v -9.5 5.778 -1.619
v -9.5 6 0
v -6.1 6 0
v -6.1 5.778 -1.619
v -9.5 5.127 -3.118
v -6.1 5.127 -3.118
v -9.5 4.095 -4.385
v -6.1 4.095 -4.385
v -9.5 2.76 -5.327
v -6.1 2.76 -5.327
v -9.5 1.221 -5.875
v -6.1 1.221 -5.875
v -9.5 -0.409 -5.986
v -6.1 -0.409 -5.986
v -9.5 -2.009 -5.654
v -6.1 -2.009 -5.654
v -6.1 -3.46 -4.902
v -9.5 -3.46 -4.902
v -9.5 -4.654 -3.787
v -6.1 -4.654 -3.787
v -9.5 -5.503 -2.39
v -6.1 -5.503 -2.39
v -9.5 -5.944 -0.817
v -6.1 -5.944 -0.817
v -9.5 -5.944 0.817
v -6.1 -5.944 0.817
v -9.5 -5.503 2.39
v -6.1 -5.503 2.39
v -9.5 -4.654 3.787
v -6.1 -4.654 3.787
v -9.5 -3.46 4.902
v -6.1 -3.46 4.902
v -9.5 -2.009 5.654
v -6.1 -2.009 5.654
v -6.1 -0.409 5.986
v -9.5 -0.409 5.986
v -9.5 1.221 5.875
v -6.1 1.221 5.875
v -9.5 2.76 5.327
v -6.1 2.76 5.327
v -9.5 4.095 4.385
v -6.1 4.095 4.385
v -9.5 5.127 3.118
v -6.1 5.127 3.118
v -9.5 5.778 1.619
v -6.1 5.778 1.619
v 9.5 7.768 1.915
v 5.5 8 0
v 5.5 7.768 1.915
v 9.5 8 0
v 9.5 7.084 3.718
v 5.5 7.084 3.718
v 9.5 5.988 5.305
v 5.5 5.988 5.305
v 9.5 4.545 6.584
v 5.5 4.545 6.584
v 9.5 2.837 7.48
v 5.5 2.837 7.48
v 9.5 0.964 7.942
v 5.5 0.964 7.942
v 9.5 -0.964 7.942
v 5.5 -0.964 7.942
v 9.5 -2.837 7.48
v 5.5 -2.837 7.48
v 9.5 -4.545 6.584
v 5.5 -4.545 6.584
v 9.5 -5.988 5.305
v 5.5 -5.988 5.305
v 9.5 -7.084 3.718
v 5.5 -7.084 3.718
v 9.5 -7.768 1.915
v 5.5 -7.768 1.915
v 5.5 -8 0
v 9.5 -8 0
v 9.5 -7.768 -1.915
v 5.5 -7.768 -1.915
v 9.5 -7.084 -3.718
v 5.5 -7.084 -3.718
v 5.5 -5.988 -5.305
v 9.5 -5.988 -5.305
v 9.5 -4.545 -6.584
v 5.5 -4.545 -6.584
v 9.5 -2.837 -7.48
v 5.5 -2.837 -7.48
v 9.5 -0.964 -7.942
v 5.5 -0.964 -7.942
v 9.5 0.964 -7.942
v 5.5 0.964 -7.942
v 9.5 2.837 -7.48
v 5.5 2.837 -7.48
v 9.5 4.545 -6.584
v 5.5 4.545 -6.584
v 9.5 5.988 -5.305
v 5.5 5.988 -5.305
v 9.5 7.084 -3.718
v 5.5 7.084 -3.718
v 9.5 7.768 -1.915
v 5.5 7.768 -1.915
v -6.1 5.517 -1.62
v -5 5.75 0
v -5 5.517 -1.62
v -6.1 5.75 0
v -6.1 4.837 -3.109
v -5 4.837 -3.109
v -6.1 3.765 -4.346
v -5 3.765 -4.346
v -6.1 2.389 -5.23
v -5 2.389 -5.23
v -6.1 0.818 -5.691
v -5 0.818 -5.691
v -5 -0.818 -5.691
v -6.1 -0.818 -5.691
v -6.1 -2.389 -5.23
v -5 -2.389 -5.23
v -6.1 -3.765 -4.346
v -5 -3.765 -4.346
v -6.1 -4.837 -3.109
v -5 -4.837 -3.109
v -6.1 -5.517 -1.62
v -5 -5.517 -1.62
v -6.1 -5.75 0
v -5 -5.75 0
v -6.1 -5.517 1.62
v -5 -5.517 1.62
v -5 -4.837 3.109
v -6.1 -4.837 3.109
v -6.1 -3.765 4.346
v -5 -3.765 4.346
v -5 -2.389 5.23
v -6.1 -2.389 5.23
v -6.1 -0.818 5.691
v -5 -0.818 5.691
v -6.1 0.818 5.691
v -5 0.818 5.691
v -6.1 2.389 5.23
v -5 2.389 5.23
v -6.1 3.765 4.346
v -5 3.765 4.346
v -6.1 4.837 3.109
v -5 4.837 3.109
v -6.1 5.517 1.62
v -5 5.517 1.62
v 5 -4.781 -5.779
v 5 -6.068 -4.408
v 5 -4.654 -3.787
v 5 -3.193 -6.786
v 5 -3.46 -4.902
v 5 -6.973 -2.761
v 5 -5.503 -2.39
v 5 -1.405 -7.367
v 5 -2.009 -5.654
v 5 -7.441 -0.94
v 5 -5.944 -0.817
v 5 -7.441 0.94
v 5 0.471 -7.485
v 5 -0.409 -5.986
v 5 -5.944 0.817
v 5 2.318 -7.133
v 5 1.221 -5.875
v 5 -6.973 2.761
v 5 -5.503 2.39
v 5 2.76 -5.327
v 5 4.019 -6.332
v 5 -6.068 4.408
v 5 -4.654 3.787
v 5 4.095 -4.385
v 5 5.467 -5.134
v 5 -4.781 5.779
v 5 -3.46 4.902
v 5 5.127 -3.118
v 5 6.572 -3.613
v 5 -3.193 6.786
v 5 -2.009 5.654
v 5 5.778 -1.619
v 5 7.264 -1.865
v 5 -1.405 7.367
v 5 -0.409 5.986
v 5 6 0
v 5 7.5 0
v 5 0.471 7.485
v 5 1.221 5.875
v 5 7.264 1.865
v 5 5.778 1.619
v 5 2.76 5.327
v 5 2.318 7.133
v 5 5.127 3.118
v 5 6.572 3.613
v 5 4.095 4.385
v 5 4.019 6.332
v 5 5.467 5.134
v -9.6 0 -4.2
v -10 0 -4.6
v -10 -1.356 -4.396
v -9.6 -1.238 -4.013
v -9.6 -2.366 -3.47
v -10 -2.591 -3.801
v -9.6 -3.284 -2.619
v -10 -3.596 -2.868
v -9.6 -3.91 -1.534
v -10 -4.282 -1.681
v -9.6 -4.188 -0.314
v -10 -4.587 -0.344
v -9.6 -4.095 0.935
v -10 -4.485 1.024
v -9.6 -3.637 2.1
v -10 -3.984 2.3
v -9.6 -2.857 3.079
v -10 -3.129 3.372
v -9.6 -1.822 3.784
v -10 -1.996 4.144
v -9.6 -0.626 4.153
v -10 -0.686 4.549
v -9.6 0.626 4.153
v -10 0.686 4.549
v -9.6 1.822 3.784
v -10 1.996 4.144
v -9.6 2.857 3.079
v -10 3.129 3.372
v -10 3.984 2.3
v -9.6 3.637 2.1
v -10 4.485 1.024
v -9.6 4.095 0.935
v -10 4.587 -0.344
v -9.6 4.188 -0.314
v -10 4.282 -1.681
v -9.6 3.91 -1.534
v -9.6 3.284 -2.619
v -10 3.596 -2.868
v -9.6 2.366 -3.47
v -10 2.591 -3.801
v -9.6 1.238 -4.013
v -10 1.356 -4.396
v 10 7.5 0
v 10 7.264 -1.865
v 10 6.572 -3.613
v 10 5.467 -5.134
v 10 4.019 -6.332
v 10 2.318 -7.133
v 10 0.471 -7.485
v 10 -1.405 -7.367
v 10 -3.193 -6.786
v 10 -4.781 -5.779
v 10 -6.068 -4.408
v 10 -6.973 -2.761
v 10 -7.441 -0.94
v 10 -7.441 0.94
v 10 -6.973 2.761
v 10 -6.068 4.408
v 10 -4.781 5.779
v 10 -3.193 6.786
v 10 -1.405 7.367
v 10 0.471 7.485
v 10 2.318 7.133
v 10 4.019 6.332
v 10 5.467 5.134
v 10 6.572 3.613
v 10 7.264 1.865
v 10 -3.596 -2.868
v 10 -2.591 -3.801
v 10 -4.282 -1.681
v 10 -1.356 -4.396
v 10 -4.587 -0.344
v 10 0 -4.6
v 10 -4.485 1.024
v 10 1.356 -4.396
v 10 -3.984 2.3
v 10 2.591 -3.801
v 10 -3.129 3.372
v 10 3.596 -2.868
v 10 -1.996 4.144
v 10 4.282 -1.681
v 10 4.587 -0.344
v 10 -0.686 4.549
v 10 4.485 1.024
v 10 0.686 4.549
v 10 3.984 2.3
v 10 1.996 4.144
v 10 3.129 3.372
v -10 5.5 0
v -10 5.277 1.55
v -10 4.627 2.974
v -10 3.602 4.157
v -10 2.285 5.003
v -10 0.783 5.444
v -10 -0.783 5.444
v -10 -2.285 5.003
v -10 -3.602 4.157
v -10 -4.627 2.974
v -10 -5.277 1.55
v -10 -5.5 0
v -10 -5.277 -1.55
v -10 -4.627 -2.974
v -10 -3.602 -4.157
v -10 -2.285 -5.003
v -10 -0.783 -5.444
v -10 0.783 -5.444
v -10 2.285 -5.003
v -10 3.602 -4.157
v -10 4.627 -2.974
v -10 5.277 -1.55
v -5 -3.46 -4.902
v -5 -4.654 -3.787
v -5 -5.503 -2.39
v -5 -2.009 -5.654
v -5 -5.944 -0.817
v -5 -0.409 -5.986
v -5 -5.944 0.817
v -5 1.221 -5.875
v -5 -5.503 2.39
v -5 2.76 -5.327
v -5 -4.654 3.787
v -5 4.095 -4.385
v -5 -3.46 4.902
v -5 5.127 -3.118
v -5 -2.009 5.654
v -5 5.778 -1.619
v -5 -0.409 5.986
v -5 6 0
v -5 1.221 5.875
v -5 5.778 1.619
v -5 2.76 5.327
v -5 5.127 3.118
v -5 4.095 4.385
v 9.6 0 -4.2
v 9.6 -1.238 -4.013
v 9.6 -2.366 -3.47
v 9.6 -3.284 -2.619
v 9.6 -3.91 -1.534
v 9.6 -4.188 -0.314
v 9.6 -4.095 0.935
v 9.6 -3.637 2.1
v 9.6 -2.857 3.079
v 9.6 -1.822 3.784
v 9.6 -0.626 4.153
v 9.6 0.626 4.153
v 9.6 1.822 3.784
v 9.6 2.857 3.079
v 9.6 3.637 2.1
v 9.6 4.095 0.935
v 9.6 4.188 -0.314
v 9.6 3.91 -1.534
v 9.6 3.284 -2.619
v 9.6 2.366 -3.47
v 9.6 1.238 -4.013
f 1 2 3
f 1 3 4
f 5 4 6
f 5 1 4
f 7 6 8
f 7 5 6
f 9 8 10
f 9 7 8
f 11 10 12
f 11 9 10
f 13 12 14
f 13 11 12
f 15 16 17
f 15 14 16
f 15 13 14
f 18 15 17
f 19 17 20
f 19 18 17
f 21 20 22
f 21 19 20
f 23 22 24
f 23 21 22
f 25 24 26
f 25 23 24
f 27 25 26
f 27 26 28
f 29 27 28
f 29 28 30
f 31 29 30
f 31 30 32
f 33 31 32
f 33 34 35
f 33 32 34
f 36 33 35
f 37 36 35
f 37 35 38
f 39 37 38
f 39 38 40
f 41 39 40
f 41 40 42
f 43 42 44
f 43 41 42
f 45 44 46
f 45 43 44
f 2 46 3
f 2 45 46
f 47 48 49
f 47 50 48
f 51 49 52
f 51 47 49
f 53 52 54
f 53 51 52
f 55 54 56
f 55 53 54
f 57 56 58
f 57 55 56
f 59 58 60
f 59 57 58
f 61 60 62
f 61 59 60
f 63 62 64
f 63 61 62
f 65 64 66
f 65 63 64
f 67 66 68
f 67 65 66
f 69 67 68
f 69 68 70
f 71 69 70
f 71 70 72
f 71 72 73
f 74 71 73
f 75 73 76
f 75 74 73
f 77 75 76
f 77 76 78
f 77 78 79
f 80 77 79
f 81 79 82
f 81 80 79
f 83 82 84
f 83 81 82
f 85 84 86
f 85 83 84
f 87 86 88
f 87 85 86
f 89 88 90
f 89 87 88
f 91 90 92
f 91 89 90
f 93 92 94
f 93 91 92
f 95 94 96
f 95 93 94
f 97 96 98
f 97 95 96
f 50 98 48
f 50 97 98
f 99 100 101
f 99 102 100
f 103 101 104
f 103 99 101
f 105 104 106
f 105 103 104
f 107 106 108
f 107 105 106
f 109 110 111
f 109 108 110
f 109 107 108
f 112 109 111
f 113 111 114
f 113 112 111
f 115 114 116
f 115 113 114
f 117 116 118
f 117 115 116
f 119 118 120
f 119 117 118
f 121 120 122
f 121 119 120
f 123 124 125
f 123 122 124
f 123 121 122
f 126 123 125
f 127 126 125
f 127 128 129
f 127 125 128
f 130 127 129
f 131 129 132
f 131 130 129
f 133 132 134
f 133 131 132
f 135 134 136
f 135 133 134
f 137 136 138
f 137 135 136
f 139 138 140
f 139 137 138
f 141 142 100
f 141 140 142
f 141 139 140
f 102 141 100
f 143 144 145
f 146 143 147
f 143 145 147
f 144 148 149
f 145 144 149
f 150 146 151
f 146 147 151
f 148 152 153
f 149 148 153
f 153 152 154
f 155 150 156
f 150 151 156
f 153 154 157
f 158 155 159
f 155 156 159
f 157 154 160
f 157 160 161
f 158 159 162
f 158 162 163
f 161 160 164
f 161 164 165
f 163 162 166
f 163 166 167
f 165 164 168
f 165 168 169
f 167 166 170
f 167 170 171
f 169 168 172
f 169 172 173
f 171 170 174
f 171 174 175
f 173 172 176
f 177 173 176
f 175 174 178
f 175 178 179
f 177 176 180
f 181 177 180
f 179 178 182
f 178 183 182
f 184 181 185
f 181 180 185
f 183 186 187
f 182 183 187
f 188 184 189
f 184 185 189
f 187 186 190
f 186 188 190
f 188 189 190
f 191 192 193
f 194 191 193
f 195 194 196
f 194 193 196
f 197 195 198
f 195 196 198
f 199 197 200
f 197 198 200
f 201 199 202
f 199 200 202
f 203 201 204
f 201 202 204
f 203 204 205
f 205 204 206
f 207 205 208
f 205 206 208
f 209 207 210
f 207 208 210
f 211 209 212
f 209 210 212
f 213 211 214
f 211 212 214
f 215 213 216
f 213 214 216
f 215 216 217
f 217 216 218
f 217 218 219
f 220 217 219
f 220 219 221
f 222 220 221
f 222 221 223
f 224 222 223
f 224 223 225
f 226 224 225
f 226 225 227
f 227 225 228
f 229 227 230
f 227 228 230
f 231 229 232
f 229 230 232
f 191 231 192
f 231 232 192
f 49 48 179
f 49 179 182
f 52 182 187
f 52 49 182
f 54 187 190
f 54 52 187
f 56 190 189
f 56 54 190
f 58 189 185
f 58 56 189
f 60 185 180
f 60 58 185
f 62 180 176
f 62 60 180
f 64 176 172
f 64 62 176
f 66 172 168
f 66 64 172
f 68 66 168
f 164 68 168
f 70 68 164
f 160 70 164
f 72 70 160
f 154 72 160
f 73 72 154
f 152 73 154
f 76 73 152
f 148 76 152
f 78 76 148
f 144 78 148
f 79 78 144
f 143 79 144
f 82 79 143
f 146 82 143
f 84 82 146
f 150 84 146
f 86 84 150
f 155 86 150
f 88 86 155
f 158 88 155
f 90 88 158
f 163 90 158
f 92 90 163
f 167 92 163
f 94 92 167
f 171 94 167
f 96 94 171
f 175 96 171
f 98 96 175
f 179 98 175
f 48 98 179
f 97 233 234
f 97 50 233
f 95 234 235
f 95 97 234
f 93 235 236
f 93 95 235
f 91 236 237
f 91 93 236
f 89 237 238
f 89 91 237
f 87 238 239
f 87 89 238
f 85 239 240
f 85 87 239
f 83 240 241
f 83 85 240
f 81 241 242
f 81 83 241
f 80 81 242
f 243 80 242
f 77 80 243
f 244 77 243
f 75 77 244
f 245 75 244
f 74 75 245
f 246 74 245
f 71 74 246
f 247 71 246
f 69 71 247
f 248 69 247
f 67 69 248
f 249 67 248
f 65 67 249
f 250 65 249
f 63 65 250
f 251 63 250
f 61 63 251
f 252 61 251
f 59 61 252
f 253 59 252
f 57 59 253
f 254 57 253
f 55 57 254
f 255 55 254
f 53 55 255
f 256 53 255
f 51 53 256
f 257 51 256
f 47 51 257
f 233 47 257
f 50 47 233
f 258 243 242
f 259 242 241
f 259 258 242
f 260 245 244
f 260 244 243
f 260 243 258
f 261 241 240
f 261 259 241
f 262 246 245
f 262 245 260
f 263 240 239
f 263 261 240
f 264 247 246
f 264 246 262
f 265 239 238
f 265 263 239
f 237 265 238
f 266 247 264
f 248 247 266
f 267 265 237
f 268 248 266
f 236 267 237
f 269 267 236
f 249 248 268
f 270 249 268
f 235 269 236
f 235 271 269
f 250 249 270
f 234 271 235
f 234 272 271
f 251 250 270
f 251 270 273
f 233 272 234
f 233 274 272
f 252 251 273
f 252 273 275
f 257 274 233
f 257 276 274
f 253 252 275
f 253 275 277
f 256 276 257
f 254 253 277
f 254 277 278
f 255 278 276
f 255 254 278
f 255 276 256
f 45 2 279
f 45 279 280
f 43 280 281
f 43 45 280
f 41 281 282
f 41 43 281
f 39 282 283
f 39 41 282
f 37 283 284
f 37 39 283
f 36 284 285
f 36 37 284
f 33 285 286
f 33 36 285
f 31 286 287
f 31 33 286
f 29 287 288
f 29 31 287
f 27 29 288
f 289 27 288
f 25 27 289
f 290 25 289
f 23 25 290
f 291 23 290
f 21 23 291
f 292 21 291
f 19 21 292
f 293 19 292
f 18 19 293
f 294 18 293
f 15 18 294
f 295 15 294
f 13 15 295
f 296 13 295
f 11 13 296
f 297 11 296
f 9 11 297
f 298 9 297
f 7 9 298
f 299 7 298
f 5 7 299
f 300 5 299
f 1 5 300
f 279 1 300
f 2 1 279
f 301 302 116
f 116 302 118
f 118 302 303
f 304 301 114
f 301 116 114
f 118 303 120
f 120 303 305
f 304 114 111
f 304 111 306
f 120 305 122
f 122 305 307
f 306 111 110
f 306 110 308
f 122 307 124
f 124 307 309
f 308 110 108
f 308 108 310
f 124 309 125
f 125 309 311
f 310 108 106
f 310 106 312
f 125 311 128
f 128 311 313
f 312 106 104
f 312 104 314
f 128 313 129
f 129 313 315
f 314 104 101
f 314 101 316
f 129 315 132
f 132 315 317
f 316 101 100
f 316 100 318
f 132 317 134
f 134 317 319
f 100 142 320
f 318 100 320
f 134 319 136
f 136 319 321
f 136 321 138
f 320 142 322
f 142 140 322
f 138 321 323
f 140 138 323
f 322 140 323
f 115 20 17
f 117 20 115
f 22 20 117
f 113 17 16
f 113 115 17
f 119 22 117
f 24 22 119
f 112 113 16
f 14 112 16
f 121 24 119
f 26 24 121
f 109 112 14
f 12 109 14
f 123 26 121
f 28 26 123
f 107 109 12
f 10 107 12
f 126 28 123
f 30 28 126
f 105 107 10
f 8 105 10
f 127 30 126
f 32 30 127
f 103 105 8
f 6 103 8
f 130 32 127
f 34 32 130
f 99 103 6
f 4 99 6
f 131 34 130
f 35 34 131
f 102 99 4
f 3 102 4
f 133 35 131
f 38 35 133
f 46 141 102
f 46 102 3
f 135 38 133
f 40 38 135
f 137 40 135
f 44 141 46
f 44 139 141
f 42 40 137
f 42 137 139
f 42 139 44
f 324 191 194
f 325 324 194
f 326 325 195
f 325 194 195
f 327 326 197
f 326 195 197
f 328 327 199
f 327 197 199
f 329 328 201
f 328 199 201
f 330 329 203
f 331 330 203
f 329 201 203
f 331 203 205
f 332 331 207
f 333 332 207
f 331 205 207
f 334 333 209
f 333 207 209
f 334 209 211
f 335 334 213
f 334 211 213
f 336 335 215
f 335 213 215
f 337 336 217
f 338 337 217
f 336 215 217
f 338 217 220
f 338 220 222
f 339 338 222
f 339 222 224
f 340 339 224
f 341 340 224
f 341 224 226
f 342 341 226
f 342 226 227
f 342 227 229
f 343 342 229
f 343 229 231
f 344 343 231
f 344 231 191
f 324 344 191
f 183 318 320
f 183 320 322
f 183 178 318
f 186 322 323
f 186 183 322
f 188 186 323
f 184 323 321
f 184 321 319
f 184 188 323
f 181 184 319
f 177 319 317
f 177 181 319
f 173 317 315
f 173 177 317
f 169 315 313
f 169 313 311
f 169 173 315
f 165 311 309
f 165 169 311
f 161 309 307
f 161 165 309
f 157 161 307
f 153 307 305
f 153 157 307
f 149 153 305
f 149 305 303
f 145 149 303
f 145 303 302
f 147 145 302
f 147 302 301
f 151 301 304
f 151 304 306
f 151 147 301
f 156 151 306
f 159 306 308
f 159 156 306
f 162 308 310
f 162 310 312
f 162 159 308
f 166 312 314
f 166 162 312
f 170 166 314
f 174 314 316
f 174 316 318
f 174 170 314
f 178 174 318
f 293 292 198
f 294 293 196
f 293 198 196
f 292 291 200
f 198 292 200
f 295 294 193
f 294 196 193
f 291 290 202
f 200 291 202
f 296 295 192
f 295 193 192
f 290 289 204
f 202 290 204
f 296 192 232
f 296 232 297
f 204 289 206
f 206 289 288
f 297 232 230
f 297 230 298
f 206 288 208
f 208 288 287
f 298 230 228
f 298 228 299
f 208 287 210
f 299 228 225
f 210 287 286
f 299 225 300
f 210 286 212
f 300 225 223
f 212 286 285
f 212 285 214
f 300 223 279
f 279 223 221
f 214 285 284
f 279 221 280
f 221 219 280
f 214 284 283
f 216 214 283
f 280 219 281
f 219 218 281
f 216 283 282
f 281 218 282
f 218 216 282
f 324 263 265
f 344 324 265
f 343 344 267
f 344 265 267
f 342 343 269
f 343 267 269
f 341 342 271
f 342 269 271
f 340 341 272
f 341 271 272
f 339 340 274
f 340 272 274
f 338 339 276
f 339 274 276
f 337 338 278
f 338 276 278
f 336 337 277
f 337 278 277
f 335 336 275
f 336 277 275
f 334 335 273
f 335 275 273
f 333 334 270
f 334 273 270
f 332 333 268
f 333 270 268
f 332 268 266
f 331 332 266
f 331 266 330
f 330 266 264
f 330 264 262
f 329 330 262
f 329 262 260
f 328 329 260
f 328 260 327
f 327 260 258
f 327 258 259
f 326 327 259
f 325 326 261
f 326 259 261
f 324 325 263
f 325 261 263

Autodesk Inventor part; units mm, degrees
ref_plane "YZ Plane" through (0, 0, 0) normal (1, 0, 0) x (0, 1, 0)
ref_plane "XZ Plane" through (0, 0, 0) normal (0, 1, 0) x (-1, 0, 0)
ref_plane "XY Plane" through (0, 0, 0) normal (0, 0, 1) x (1, 0, 0)
sketch "Náčrt1" plane through (0, 0, 0) normal (0, 0, 1) x (1, 0, 0)
  line L0 (-8, 0) -> (8, 0)
  line L1 (8, 0) -> (8, 27.5) construction
  line L2 (8, 27.5) -> (5.5, 27.5) construction
  line L3 (5.5, 27.5) -> (5.5, 26.5) construction
  line L4 (0.5, 21.5) -> (-0.5, 21.5) construction
  line L5 (-5.5, 26.5) -> (-5.5, 27.5) construction
  line L6 (-5.5, 27.5) -> (-8, 27.5) construction
  line L7 (-8, 27.5) -> (-8, 0) construction
  line L8 (-8, 16) -> (-6.85, 16) construction
  line L9 (-6.85, 16) -> (-6.85, 17.25) construction
  line L10 (-6.85, 17.25) -> (-5, 17.25) construction
  line L11 (-5, 17.25) -> (-5, 16) construction
  line L12 (-5, 16) -> (5, 16) construction
  line L13 (5, 16) -> (5, 14) construction
  line L14 (5, 14) -> (8, 14) construction
  arc A0 (-5.5, 26.5) -> (-0.5, 21.5) centre (-0.5, 26.5) ccw construction
  arc A1 (0.5, 21.5) -> (5.5, 26.5) centre (0.5, 26.5) ccw construction
  line L15 (5, 6) -> (5, 8)
  line L16 (5, 8) -> (10, 8)
  line L17 (10, 8) -> (10, 0)
  line L18 (10, 0) -> (8, 0)
  line L19 (-10, 6) -> (-10, 0)
  line L20 (-10, 0) -> (-8, 0)
  line L21 (-5, 6) -> (-5, 5.75)
  line L22 (-5, 5.75) -> (-6.1, 5.75)
  line L23 (-6.1, 5.75) -> (-6.1, 6)
  line L24 (-5, 6) -> (5, 6)
  line L25 (-6.1, 6) -> (-10, 6)
  point P0 (0, 0)
  point P1 (0, 0)
  point P2 (5.5, 21.5)
  point P3 (-5.5, 21.5)
  dimension "d0" = 55
  dimension "d1" = 16
  dimension "d3" = 2.5
  dimension "d4" = 6
  dimension "d5" = 32
  dimension "d6" = 28
  dimension "d7" = 10
  dimension "d8" = 13
  dimension "d9" = 34.5
  dimension "d10" = 1.85
  dimension "d18" = 11
  dimension "d24" = 43
  dimension "d27" = 5
  dimension "d31" = 16
  dimension "d32" = 2
  dimension "d33" = 2
  dimension "d34" = 1.1
  dimension "d35" = 11.5
  dimension "d36" = 12
  dimension "d37" = 20
revolve "Rotace1" add sketch "Náčrt1" angle 360 about axis through (-8, 0, 0) along (1, 0, 0)
chamfer "Zkosení1" distance 0.5 angle 45 3 edges at (10, -8, 0) (-10, -6, 0) (5, -8, 0)
hole "Díra1" at (10, 0, 0) direction (-1, 0, 0) diameter 8.4 end through all clearance for "Strojní šroub se zápustnou hlavou" size "M8" standard "Ansi M metrický profil"
chamfer "Zkosení3" distance 0.4 angle 45 2 edges at (-10, 0, 4.2) (10, 0, 4.2)
properties part number "DD_KVD_004_03" material "Nerezová ocel"
